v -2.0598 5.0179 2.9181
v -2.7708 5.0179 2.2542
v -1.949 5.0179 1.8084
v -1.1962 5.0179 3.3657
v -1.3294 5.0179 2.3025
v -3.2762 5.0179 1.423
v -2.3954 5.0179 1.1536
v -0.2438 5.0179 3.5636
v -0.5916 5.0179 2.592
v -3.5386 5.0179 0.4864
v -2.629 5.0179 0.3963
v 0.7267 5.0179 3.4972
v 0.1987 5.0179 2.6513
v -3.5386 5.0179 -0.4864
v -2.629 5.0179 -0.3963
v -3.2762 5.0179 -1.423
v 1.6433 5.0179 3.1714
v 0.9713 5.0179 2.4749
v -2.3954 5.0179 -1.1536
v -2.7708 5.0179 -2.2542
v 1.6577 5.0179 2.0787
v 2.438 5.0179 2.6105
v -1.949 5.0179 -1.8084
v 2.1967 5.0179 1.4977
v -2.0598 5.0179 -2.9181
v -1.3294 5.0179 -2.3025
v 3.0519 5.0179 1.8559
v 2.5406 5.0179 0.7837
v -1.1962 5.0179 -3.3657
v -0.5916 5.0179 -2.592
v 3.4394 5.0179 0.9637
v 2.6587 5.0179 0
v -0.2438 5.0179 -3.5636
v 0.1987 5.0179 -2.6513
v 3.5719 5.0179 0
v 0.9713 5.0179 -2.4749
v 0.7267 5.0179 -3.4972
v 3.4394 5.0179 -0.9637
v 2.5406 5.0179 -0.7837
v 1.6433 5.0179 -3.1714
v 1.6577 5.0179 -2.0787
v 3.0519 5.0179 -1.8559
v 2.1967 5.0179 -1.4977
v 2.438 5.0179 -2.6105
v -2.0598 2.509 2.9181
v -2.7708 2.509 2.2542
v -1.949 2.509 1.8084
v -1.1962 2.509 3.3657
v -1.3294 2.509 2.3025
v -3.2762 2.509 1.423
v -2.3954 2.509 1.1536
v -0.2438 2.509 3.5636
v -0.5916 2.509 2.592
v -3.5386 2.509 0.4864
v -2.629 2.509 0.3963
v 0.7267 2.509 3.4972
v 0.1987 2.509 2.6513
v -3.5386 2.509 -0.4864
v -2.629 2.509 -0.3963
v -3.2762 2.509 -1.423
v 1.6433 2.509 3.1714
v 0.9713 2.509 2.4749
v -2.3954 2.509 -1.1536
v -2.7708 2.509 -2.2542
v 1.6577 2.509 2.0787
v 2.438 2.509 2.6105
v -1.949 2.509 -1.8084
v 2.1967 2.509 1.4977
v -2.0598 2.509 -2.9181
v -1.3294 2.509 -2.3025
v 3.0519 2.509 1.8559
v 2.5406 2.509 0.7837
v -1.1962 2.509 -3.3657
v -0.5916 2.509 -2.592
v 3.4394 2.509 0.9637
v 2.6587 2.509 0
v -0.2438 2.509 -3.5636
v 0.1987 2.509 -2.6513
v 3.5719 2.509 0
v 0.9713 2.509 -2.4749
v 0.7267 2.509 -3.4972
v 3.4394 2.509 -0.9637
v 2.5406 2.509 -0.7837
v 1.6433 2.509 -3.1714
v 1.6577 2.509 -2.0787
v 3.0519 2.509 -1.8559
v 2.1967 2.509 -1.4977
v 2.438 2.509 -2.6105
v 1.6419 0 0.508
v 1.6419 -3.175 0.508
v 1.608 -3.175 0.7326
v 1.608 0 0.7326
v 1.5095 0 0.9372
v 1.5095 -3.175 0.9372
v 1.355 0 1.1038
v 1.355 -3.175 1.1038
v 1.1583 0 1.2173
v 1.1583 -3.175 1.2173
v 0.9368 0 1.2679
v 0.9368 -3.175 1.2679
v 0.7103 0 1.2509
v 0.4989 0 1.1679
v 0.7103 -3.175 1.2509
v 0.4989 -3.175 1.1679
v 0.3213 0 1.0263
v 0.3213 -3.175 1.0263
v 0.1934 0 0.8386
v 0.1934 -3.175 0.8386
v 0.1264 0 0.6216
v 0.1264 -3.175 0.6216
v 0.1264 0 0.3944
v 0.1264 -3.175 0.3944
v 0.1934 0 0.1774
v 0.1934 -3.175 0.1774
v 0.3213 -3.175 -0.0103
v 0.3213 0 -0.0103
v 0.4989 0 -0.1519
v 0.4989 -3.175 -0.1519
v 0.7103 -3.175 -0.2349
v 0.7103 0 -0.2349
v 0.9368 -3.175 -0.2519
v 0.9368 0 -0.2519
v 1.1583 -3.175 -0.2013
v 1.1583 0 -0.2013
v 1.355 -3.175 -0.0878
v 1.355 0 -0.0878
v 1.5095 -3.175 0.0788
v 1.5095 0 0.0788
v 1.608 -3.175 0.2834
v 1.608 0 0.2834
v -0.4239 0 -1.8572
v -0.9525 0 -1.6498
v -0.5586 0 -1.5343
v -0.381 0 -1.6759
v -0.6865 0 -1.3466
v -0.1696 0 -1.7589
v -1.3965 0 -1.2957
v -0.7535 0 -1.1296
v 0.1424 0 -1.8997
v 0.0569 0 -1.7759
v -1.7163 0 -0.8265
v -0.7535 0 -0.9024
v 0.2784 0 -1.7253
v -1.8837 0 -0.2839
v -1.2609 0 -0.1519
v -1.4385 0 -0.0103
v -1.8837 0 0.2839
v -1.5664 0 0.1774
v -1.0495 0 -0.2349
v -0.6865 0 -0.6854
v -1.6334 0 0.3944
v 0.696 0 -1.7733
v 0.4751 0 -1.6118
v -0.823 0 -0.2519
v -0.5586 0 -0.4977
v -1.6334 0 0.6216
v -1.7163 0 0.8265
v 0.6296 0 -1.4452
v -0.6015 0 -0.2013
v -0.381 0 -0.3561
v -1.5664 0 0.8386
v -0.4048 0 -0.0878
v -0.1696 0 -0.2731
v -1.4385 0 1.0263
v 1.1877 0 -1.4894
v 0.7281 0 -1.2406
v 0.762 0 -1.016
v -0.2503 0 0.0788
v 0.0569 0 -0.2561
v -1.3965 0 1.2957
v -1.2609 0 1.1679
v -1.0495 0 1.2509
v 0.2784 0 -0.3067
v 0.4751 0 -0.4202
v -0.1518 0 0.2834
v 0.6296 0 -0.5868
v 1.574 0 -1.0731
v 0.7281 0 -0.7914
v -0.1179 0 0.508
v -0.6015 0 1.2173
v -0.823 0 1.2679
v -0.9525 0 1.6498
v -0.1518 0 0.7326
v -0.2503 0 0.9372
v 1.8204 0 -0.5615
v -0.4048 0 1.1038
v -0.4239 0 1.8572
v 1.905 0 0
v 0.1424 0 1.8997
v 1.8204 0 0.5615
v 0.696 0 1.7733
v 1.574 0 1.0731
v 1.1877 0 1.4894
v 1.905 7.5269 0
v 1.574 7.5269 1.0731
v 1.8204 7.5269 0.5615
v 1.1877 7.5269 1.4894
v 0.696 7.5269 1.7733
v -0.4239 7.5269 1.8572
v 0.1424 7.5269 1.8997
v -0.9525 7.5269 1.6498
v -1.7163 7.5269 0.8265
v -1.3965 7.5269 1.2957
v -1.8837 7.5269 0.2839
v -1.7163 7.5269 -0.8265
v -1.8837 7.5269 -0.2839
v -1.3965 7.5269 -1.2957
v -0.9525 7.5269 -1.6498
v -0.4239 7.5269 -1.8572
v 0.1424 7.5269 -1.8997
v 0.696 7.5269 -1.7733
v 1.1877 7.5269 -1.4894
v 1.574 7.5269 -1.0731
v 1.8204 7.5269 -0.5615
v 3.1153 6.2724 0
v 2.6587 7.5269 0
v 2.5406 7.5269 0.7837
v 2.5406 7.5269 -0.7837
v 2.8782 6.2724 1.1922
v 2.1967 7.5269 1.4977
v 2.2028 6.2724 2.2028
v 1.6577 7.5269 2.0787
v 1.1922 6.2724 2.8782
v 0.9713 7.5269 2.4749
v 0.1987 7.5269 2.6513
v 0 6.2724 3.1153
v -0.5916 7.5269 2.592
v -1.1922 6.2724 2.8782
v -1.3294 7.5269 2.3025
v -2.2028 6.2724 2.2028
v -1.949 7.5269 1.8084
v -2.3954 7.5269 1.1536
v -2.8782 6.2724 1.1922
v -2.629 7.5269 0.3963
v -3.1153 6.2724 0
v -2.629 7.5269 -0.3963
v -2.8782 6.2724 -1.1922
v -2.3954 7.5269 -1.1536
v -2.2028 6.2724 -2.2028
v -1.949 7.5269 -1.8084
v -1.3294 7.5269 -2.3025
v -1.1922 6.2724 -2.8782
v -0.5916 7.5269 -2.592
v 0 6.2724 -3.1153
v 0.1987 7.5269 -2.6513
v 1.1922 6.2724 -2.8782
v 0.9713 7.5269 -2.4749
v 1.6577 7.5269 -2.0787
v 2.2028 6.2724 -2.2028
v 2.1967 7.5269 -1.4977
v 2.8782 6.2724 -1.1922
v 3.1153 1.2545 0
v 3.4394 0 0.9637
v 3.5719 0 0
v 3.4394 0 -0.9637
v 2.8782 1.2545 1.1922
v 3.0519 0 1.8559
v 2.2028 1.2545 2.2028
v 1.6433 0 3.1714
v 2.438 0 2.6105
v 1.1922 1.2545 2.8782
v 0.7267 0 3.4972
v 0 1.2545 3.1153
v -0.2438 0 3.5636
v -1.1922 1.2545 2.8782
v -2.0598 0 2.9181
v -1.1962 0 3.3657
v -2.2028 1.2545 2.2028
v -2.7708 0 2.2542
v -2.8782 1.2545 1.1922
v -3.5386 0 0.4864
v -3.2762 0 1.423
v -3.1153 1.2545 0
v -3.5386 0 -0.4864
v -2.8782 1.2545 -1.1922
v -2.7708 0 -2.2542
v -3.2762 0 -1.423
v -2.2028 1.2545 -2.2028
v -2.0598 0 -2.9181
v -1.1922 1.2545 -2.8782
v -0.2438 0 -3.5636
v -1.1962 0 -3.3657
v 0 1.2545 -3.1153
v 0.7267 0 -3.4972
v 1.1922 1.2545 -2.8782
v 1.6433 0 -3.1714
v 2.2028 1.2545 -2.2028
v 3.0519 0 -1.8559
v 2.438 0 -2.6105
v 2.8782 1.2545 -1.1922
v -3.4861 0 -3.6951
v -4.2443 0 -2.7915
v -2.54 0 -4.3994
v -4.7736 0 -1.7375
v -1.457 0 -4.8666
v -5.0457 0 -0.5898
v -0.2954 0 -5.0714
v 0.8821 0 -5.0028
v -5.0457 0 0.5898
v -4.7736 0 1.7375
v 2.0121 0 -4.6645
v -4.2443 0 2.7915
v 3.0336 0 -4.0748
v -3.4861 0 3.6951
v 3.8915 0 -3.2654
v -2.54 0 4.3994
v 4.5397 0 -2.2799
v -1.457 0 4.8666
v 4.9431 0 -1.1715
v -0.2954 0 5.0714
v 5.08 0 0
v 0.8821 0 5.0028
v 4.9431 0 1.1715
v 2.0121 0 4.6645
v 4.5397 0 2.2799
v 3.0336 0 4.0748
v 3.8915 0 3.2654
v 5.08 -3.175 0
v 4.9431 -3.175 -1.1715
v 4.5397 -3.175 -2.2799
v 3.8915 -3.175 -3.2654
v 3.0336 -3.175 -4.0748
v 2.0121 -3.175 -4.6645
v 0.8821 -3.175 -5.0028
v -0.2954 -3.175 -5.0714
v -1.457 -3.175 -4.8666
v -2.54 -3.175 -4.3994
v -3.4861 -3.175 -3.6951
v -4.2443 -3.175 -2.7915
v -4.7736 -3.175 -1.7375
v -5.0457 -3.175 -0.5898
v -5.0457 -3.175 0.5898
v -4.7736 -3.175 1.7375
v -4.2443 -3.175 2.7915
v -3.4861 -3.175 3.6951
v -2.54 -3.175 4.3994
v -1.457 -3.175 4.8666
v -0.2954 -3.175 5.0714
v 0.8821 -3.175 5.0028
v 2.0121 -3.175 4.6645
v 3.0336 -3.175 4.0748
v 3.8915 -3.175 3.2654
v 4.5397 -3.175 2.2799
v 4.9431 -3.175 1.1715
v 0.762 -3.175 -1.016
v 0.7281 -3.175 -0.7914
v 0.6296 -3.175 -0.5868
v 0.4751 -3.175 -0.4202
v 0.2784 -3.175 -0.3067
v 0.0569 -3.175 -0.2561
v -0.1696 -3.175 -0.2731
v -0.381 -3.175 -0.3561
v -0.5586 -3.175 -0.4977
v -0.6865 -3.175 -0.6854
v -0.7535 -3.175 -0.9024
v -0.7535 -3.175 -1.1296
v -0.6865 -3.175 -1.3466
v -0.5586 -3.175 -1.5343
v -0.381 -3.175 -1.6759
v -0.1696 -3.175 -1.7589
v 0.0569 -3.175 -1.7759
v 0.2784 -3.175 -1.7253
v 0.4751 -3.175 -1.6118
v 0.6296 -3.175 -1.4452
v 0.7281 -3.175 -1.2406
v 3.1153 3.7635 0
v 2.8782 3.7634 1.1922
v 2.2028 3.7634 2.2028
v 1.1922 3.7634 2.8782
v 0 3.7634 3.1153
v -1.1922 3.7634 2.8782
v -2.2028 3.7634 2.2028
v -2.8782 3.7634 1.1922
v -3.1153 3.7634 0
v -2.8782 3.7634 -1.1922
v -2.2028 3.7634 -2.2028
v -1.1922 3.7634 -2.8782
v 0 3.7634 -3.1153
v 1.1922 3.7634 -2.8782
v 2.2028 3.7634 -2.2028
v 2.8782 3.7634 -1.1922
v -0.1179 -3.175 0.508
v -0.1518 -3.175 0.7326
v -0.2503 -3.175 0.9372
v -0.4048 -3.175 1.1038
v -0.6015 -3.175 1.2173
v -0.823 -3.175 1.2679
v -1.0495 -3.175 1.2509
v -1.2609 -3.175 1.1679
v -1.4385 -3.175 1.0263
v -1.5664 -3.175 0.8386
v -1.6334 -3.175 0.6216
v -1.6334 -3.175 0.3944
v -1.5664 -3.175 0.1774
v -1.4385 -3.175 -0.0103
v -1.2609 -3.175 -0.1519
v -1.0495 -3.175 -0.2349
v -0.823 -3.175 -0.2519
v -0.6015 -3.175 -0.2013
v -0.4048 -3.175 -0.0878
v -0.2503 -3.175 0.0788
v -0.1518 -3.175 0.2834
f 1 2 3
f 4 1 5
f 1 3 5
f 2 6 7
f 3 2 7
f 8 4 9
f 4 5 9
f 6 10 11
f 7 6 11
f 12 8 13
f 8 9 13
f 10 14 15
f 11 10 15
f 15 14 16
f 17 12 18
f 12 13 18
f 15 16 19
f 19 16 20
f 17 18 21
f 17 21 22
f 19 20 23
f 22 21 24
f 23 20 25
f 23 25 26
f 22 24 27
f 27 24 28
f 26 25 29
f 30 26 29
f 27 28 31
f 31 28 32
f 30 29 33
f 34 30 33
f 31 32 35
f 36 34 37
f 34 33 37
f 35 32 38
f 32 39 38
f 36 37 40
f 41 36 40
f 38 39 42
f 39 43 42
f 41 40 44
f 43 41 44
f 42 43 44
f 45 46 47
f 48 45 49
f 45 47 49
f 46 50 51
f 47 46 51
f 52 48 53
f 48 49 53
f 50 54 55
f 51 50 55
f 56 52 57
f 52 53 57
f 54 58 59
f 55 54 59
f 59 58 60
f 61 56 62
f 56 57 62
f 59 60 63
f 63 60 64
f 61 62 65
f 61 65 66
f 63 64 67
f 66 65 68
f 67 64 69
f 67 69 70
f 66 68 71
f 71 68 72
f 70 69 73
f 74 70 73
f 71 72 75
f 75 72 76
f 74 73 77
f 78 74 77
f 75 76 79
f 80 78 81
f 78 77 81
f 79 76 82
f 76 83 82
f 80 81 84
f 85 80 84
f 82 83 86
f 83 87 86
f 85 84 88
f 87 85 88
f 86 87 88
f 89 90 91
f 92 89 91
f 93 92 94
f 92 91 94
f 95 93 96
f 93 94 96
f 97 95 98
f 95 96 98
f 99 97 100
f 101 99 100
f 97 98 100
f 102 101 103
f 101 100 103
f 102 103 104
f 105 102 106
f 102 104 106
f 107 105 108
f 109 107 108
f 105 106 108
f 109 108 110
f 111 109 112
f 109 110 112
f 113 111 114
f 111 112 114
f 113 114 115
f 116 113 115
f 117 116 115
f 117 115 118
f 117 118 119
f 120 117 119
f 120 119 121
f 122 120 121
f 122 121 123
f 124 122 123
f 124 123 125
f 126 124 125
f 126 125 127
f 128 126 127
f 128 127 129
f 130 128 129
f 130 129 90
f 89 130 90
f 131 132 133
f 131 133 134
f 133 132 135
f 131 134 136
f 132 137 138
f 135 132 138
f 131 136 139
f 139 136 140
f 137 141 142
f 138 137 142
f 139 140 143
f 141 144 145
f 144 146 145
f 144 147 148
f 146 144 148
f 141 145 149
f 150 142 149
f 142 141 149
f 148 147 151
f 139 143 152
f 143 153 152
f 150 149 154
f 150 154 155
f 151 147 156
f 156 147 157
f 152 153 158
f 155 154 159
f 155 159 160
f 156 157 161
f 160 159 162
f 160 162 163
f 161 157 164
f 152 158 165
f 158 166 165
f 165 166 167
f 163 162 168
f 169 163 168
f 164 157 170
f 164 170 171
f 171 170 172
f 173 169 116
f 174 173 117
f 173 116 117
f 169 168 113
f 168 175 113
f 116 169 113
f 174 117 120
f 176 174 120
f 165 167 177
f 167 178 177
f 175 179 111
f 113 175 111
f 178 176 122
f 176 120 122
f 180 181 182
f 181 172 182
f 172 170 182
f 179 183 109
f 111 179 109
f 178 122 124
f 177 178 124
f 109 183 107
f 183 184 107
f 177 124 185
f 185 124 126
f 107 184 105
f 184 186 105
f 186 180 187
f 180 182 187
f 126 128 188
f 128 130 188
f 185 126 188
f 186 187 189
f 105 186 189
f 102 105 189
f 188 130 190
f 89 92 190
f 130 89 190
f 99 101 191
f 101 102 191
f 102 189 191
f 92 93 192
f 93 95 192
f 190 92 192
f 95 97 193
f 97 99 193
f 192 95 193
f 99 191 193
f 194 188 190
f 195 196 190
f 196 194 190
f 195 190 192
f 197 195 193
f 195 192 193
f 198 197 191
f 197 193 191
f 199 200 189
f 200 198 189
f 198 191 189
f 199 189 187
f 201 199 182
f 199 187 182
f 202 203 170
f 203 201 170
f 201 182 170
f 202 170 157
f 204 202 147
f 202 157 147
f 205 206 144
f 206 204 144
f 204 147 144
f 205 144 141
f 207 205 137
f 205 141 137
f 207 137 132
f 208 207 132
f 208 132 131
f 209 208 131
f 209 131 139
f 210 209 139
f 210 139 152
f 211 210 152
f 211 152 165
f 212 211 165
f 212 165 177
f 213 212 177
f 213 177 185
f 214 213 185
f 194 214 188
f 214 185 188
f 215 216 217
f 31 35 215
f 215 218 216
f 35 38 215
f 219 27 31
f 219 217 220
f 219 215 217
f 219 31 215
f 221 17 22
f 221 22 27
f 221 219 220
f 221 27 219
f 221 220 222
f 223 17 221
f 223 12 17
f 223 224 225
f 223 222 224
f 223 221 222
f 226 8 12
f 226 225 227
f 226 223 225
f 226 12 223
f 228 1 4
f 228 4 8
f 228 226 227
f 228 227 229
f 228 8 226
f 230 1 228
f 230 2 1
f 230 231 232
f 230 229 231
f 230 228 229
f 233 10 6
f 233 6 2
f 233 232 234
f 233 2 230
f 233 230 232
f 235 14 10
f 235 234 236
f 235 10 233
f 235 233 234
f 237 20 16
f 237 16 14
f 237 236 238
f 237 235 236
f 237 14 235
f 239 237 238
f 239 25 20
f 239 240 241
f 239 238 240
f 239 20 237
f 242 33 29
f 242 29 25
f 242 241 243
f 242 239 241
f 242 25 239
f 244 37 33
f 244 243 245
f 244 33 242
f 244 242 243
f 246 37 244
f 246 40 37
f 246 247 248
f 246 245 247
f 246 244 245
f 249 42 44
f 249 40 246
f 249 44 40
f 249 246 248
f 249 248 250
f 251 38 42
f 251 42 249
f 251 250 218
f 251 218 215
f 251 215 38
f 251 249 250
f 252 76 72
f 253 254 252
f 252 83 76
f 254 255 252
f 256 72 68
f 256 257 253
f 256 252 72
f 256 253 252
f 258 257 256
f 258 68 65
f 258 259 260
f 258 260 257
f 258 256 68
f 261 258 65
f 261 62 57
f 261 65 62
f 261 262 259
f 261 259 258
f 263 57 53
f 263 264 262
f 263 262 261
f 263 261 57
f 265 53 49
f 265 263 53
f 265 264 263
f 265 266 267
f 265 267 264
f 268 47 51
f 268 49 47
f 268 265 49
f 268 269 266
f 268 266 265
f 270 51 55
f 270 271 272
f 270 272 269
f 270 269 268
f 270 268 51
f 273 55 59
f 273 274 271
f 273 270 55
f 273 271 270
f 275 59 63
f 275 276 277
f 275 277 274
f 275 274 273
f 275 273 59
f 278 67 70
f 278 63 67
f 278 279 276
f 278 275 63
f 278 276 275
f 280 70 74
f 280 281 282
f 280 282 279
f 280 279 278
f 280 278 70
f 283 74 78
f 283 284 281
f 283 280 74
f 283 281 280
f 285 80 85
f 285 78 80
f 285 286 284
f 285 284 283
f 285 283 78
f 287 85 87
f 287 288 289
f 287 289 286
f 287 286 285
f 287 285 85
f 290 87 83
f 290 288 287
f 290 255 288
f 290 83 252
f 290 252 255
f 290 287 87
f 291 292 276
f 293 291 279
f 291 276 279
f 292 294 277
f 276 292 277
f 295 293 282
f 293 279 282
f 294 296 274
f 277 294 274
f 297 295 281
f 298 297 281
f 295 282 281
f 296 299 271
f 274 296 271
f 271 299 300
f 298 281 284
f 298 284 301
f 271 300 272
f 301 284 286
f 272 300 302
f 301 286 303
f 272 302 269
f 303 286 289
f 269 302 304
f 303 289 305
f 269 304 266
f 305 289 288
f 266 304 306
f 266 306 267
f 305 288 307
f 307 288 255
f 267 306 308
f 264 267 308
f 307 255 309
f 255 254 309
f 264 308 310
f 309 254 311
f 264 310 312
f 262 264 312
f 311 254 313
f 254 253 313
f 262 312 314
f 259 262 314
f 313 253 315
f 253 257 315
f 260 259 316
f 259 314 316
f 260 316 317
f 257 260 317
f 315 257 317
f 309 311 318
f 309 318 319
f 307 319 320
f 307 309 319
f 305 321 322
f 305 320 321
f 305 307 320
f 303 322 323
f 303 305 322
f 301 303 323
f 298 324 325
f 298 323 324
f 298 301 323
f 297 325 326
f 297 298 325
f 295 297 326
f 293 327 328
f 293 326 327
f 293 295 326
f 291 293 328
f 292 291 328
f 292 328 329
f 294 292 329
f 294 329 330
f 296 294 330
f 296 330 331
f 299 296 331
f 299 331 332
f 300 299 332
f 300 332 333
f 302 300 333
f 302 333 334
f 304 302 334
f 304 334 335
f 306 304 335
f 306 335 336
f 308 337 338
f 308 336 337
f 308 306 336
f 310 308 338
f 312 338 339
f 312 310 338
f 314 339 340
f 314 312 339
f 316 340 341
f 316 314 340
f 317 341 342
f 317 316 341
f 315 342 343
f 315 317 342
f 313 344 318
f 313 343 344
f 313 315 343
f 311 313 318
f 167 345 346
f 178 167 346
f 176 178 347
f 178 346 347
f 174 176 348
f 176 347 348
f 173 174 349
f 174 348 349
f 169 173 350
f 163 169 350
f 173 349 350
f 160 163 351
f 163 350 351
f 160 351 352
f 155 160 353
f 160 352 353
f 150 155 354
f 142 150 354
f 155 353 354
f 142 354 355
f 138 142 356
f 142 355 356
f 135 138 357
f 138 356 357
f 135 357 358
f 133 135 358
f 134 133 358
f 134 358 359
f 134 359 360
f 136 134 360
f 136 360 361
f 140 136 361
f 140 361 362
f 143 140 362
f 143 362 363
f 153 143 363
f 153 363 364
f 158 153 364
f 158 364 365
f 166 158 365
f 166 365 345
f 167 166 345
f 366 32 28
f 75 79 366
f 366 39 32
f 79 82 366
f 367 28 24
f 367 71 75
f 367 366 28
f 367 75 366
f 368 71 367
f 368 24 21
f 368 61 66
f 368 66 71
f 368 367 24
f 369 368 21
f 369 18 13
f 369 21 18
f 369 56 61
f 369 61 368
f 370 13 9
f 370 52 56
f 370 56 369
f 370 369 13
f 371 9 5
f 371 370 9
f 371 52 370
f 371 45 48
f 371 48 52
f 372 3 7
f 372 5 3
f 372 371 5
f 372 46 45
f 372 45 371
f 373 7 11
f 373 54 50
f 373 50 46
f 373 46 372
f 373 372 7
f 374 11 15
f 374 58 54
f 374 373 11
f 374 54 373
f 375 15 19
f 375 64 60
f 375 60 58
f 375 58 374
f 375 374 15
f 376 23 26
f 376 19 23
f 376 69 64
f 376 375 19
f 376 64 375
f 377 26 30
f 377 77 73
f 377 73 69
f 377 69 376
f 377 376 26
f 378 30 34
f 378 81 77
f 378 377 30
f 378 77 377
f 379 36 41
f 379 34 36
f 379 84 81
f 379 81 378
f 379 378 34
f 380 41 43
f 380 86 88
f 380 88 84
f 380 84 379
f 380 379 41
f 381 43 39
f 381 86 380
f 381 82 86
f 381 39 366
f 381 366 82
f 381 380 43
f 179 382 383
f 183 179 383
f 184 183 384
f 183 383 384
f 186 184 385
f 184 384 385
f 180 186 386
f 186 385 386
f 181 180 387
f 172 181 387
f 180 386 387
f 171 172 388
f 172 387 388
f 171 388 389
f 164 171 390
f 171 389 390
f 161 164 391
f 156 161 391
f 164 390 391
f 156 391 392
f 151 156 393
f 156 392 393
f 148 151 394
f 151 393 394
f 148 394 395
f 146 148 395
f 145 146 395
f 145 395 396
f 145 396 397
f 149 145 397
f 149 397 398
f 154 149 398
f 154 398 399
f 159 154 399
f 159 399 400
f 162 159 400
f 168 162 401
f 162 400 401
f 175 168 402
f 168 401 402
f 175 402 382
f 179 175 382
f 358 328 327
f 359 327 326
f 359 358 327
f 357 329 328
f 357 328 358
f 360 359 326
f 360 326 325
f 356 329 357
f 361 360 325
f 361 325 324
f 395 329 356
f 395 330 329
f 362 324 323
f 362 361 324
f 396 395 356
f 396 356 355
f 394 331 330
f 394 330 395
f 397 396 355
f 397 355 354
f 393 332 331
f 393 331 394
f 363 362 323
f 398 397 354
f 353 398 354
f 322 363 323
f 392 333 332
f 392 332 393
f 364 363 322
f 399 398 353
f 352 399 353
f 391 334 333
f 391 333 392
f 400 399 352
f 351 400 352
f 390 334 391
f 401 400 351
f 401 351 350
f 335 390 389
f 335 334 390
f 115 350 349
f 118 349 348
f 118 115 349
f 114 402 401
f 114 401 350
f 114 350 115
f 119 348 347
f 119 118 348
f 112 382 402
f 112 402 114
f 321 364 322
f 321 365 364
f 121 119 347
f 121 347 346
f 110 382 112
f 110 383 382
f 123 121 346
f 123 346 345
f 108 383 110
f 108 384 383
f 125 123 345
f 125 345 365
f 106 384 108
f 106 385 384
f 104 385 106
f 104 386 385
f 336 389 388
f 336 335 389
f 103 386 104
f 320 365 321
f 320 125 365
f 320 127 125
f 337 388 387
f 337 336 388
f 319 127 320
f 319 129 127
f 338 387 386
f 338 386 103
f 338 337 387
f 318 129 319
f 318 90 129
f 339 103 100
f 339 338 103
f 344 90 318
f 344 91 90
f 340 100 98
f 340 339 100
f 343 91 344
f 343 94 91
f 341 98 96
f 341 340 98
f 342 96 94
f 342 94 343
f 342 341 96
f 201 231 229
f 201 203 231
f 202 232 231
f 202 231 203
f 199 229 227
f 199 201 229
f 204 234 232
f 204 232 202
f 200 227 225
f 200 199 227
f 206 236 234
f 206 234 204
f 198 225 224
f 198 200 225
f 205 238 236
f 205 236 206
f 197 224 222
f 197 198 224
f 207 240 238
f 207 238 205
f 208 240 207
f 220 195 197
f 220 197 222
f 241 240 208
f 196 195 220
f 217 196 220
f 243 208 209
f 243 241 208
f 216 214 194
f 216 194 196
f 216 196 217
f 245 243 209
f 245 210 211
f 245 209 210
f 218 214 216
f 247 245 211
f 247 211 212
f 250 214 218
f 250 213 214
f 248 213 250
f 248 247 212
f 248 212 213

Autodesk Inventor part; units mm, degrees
ref_plane "YZ Plane" through (0, 0, 0) normal (1, 0, 0) x (0, 1, 0)
ref_plane "XZ Plane" through (0, 0, 0) normal (0, 1, 0) x (-1, 0, 0)
ref_plane "XY Plane" through (0, 0, 0) normal (0, 0, 1) x (1, 0, 0)
sketch "Sketch1" plane through (0, 0, 0) normal (0, 0, 1) x (1, 0, 0)
  line L0 (0, 0) -> (3.5719, 0) construction
  line L1 (1.905, 7.5269) -> (1.905, 0)
  line L2 (1.905, 0) -> (3.5719, 0)
  line L3 (0, 0) -> (0, 5.4125) construction
  line L4 (3.5719, 0) -> (2.6587, 2.509)
  line L5 (2.6587, 2.509) -> (3.5719, 2.509)
  line L6 (3.5719, 2.509) -> (2.6587, 5.0179)
  line L7 (2.6587, 5.0179) -> (3.5719, 5.0179)
  line L8 (3.5719, 5.0179) -> (2.6587, 7.5269)
  line L9 (2.6587, 7.5269) -> (1.905, 7.5269)
  point P0 (2.0609, 0)
  dimension "d0" = 3.5719
  dimension "d4" = 1.905
  dimension "d9" = 70
  dimension "d12" = 70
revolve "Revolution1" add sketch "Sketch1" angle 360 about axis through (0, 0, 0) along (0, 1, 0)
sketch "Sketch2" plane through (0, 0, 0) normal (0, -1, 0) x (1, 0, 0)
  circle A0 centre (0, 0) radius 5.08
  dimension "d5" = 10.16
extrude "Extrusion1" add sketch "Sketch2" along normal blind 3.175
sketch "Sketch4" plane through (0, -3.175, 0) normal (0, -1, 0) x (1, 0, 0)
  circle A0 centre (0, 0) radius 1.905 projected
  circle A1 centre (0, -1.016) radius 0.762
  circle A2 centre (0.8799, 0.508) radius 0.762
  circle A3 centre (-0.8799, 0.508) radius 0.762
  dimension "d50" = 1.524
  dimension "d51" = 0.127
  dimension "d54" = 360
extrude "Extrusion3" cut sketch "Sketch4" against normal through all contours A1 | A2 | A3
properties part number "Hose Barb_3DPrint"
